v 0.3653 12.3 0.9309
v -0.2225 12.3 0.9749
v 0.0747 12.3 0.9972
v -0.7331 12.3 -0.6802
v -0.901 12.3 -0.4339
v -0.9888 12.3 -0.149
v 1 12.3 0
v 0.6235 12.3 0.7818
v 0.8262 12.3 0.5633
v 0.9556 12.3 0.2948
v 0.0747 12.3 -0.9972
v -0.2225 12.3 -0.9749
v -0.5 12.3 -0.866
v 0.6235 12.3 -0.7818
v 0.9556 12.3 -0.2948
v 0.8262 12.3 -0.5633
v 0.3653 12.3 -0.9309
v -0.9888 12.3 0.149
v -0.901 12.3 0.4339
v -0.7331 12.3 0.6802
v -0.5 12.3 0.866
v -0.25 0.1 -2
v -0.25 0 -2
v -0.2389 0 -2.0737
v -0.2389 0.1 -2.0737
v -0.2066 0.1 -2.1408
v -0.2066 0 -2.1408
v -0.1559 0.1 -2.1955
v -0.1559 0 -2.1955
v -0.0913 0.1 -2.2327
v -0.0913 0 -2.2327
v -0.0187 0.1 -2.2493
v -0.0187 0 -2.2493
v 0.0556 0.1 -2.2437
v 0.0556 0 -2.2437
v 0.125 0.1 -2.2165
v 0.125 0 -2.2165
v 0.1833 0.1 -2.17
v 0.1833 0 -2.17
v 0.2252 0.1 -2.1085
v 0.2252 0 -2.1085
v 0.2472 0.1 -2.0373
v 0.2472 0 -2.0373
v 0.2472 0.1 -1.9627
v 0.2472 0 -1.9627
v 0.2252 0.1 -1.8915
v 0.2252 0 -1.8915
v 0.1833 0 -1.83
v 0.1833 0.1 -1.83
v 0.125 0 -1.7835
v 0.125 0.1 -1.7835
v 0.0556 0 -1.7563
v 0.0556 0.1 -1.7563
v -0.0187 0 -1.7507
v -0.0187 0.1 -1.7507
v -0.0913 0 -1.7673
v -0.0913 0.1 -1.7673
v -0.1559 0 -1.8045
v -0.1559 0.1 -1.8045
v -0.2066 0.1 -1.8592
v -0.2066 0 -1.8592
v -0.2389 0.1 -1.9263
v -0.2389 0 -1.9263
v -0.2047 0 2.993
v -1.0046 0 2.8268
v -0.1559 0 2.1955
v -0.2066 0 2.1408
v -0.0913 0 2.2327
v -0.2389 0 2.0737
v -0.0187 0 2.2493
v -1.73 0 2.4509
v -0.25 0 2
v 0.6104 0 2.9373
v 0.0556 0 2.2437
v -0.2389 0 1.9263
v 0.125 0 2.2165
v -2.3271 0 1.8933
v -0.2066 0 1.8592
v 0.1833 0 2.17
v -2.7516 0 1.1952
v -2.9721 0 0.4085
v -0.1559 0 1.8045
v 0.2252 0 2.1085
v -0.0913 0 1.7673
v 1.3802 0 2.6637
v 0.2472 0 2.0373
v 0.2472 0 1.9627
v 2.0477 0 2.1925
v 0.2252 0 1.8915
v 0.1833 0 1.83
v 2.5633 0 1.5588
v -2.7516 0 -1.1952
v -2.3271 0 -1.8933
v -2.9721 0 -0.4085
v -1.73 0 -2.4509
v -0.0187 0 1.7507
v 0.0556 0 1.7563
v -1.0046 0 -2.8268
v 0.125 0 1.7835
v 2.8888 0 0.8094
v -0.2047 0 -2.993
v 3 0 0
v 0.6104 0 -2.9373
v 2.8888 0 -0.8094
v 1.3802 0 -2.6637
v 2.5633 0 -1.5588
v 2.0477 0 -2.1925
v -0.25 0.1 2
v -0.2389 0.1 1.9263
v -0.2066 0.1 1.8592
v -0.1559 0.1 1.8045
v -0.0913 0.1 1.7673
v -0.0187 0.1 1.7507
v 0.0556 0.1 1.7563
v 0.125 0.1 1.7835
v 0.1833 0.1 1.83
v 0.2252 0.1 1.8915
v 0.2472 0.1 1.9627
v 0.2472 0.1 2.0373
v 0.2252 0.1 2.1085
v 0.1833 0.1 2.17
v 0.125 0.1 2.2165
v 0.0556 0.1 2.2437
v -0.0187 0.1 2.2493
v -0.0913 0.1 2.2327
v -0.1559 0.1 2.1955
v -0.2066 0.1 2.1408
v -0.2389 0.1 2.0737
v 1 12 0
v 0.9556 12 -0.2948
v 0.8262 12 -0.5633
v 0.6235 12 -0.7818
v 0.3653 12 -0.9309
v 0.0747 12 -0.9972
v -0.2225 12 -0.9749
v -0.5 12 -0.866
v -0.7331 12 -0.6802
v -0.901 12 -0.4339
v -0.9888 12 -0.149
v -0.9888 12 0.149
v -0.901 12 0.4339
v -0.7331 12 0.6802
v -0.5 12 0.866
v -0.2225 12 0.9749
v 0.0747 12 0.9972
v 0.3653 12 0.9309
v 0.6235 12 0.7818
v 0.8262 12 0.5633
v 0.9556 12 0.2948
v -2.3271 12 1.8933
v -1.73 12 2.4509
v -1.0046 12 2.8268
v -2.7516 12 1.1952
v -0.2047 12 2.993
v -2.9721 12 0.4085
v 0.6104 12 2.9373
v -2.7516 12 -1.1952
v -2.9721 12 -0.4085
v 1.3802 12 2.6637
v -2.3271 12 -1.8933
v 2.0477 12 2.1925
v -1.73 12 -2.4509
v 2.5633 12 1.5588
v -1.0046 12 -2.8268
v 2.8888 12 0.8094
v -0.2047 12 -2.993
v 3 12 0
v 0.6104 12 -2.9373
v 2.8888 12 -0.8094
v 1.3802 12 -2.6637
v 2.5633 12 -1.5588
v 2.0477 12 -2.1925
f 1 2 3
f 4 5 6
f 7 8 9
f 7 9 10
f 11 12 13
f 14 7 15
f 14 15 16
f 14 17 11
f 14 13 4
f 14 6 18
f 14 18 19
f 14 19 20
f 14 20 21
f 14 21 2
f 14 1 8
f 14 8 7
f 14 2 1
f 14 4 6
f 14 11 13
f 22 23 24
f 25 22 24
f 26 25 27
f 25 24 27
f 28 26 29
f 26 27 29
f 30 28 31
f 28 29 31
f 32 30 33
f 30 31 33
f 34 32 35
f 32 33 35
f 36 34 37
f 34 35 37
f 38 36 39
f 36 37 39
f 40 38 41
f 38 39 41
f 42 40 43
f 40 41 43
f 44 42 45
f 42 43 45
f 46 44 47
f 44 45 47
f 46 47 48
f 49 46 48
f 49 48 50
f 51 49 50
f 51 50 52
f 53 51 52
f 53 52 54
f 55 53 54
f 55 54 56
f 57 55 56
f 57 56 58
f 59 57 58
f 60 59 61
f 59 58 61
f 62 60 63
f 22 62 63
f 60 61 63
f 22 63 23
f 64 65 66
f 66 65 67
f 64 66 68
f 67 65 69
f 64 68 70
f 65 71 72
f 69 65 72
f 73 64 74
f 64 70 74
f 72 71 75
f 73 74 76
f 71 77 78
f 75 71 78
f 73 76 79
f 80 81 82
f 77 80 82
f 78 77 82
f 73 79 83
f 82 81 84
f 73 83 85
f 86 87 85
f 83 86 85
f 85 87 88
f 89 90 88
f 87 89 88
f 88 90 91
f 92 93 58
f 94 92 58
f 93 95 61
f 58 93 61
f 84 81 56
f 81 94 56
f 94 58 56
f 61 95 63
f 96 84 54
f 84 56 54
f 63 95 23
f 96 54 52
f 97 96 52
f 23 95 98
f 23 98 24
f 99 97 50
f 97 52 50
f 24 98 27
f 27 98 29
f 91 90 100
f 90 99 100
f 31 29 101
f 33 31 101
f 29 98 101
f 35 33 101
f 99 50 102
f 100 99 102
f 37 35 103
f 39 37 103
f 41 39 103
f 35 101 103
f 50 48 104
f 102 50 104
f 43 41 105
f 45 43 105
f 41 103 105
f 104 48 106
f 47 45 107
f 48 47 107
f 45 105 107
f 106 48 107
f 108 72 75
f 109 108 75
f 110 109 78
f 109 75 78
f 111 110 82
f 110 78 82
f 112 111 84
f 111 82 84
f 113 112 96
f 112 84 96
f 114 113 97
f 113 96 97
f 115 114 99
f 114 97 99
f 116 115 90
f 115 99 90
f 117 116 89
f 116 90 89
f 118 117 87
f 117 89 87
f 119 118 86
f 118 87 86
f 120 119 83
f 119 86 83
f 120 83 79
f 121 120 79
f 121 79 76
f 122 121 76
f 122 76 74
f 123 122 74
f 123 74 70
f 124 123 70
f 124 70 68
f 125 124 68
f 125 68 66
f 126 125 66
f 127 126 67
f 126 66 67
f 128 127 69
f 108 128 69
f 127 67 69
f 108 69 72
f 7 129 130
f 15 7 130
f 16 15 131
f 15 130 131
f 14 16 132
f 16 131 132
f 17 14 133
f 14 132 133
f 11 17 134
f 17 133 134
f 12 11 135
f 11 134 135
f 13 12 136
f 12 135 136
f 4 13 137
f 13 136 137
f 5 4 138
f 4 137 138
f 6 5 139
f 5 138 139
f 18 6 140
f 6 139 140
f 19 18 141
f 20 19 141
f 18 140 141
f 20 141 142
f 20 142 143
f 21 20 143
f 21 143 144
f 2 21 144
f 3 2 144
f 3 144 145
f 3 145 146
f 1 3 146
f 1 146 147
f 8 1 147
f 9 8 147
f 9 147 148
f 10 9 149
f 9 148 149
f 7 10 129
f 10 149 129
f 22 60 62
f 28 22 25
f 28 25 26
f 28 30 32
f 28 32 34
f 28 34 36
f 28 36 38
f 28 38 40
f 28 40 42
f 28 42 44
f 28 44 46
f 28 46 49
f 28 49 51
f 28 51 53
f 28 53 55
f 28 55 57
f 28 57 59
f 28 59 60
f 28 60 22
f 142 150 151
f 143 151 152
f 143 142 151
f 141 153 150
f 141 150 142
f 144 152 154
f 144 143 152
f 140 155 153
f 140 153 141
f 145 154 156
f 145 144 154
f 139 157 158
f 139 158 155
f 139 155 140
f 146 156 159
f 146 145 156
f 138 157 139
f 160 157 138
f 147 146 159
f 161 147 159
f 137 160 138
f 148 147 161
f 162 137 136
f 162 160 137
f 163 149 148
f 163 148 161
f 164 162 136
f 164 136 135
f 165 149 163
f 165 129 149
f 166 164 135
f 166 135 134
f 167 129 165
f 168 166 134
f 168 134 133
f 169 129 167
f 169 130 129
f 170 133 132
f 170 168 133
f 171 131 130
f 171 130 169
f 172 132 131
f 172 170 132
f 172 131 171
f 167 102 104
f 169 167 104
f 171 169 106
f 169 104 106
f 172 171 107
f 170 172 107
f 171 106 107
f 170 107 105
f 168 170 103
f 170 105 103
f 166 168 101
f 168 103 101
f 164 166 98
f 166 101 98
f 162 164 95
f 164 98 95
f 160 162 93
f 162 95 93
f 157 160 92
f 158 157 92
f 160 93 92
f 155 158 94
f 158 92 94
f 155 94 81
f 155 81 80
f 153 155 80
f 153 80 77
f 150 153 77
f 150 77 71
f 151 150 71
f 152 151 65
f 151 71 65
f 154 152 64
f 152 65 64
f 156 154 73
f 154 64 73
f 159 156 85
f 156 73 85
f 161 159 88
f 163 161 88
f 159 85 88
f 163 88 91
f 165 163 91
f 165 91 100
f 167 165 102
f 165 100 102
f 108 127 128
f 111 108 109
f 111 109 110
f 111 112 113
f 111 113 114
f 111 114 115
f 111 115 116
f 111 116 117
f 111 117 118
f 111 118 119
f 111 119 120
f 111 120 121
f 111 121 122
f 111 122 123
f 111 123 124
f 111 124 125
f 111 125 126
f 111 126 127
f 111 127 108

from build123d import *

# Parameters (mm, degrees)
SKETCH2_R           = 3
BOSS_EXTRUDE1_DEPTH = 12
SKETCH3_R           = 1
BOSS_EXTRUDE2_DEPTH = 0.3
SKETCH4_R           = 0.25
CUT_EXTRUDE1_DEPTH  = 0.1


with BuildPart() as part:
    # Sketch2 → Boss-Extrude1 (new body)
    with BuildSketch(Plane(origin=(0, 0, 0), x_dir=(1, 0, 0), z_dir=(0, 1, 0))):
        Circle(SKETCH2_R)
    extrude(amount=BOSS_EXTRUDE1_DEPTH)

    # Sketch3 → Boss-Extrude2 (add)
    with BuildSketch(Plane(origin=(0, 12, 0), x_dir=(1, 0, 0), z_dir=(0, 1, 0))):
        Circle(SKETCH3_R)
    extrude(amount=BOSS_EXTRUDE2_DEPTH)

    # Sketch4 → Cut-Extrude1 (cut)
    with BuildSketch(Plane(origin=(0, 0, 0), x_dir=(-1, 0, 0), z_dir=(0, -1, 0))):
        with Locations((0, 2)):
            Circle(SKETCH4_R)
        with Locations((0, -2)):
            Circle(SKETCH4_R)
    extrude(amount=-CUT_EXTRUDE1_DEPTH, mode=Mode.SUBTRACT)


solid = part.part
